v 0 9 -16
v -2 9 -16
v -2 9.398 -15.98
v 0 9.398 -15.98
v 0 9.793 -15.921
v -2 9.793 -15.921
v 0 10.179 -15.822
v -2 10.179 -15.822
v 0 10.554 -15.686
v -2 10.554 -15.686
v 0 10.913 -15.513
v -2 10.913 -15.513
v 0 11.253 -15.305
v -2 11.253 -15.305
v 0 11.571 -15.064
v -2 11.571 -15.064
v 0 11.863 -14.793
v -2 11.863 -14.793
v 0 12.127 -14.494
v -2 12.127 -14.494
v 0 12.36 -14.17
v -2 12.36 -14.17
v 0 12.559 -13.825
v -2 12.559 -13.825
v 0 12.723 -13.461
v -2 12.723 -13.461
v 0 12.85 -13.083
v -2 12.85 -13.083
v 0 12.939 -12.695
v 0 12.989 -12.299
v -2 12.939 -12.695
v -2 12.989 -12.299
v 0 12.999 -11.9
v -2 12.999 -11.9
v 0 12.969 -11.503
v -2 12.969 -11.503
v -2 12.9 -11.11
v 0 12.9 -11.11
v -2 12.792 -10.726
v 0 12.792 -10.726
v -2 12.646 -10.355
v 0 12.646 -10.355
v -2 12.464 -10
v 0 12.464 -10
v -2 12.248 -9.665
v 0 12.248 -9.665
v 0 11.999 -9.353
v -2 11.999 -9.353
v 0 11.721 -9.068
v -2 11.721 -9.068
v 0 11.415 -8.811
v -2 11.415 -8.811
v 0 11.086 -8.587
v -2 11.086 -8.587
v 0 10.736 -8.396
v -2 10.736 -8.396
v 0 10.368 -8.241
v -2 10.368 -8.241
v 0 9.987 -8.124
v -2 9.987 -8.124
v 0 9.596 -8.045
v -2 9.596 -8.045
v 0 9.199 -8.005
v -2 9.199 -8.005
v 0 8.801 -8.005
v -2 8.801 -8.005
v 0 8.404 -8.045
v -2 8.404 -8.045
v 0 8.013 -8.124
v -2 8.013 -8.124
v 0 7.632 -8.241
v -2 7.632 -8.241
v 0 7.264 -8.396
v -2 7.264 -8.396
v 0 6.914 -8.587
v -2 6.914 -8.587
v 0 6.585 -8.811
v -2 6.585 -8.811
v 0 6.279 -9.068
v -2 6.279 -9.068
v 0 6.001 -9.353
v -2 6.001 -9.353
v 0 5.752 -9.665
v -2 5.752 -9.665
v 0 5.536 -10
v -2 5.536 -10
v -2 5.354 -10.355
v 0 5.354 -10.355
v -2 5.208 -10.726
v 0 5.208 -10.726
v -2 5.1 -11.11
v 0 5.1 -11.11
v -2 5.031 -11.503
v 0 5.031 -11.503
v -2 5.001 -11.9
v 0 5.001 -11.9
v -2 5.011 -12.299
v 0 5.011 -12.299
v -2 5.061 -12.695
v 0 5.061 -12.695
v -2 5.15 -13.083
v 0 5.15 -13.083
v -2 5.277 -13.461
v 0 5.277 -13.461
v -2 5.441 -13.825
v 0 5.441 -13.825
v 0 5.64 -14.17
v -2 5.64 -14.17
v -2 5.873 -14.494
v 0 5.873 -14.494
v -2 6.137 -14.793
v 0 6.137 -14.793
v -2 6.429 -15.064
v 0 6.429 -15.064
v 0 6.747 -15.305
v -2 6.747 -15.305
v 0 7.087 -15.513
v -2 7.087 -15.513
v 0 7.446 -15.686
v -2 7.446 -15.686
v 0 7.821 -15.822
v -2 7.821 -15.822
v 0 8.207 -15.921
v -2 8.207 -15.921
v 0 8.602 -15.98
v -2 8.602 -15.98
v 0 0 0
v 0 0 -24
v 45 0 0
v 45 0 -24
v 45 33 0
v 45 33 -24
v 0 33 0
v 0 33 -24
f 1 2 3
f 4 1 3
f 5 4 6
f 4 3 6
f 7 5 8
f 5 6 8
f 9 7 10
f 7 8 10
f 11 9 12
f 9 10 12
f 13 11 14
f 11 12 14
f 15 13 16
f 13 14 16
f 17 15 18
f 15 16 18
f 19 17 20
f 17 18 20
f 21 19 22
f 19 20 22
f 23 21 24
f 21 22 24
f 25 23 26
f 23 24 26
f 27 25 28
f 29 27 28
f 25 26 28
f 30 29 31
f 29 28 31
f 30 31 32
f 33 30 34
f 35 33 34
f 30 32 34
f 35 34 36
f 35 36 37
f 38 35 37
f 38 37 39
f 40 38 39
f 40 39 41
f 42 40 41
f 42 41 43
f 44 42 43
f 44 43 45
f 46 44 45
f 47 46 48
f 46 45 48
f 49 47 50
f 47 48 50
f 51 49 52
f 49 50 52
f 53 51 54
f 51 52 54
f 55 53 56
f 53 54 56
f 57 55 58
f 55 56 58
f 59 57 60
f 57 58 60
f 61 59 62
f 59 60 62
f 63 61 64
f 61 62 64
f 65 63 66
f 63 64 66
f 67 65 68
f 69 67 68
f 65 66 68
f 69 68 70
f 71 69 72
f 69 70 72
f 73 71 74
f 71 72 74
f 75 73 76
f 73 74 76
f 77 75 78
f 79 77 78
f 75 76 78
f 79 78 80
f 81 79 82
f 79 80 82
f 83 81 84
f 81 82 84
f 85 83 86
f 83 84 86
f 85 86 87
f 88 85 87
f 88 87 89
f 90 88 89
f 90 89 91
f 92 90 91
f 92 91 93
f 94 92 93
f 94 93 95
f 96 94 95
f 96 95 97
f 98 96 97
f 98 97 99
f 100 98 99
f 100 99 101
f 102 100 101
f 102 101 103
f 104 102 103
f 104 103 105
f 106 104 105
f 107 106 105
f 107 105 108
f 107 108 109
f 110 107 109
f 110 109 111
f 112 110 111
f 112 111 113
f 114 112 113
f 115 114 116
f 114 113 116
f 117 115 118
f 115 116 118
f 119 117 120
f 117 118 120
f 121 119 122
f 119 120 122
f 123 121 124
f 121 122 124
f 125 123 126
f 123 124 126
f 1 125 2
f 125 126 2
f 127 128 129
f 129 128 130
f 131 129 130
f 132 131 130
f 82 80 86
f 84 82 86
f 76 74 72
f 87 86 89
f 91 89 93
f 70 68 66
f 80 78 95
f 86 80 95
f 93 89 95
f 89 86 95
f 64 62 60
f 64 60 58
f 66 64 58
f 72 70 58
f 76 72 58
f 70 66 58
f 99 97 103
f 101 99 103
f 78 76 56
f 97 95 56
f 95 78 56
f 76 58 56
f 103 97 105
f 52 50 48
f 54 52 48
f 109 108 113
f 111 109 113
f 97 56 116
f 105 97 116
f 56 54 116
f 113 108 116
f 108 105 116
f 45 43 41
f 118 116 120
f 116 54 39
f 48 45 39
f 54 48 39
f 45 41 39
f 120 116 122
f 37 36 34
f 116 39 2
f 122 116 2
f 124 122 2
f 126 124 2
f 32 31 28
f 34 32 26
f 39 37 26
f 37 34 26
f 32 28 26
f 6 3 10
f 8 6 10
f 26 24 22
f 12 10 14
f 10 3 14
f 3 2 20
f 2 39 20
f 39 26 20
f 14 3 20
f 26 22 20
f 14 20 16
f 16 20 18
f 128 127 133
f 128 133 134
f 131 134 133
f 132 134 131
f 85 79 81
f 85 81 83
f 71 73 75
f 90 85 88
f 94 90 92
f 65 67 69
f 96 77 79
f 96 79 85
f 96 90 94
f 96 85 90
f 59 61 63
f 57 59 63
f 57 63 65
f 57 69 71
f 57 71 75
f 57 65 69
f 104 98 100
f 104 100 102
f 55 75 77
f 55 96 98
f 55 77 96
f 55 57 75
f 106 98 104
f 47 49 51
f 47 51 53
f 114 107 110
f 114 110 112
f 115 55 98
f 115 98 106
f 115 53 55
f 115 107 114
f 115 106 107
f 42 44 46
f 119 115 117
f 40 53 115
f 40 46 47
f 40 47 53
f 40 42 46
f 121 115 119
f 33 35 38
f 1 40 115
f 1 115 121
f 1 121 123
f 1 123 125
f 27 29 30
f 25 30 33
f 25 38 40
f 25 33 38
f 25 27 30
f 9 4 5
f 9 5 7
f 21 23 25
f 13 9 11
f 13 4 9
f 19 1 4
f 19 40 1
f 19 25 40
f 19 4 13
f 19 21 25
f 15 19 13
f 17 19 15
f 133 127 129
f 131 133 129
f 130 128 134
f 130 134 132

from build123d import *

# Parameters (mm, degrees)
SK_PUMP_BODY_W  = 45
SK_PUMP_BODY_H  = 24
PUMP_BODY_DEPTH = 33
INLET_START     = -2
SK_INLET_R      = 4
INLET_DEPTH     = 2


with BuildPart() as part:
    # SK Pump body → Pump body (new body)
    with BuildSketch(Plane(origin=(0, 0, 0), x_dir=(1, 0, 0), z_dir=(0, 1, 0))):
        with Locations((22.5, 12)):
            Rectangle(SK_PUMP_BODY_W, SK_PUMP_BODY_H)
    extrude(amount=PUMP_BODY_DEPTH)


with BuildPart() as body_2:
    # SK Inlet → Inlet (new body)
    with BuildSketch(Plane(origin=(0, 0, 0), x_dir=(0, 0, -1), z_dir=(1, 0, 0)).offset(INLET_START)):
        with Locations((12, 9)):
            Circle(SK_INLET_R)
    extrude(amount=INLET_DEPTH)


solid = Compound([part.part, body_2.part])
